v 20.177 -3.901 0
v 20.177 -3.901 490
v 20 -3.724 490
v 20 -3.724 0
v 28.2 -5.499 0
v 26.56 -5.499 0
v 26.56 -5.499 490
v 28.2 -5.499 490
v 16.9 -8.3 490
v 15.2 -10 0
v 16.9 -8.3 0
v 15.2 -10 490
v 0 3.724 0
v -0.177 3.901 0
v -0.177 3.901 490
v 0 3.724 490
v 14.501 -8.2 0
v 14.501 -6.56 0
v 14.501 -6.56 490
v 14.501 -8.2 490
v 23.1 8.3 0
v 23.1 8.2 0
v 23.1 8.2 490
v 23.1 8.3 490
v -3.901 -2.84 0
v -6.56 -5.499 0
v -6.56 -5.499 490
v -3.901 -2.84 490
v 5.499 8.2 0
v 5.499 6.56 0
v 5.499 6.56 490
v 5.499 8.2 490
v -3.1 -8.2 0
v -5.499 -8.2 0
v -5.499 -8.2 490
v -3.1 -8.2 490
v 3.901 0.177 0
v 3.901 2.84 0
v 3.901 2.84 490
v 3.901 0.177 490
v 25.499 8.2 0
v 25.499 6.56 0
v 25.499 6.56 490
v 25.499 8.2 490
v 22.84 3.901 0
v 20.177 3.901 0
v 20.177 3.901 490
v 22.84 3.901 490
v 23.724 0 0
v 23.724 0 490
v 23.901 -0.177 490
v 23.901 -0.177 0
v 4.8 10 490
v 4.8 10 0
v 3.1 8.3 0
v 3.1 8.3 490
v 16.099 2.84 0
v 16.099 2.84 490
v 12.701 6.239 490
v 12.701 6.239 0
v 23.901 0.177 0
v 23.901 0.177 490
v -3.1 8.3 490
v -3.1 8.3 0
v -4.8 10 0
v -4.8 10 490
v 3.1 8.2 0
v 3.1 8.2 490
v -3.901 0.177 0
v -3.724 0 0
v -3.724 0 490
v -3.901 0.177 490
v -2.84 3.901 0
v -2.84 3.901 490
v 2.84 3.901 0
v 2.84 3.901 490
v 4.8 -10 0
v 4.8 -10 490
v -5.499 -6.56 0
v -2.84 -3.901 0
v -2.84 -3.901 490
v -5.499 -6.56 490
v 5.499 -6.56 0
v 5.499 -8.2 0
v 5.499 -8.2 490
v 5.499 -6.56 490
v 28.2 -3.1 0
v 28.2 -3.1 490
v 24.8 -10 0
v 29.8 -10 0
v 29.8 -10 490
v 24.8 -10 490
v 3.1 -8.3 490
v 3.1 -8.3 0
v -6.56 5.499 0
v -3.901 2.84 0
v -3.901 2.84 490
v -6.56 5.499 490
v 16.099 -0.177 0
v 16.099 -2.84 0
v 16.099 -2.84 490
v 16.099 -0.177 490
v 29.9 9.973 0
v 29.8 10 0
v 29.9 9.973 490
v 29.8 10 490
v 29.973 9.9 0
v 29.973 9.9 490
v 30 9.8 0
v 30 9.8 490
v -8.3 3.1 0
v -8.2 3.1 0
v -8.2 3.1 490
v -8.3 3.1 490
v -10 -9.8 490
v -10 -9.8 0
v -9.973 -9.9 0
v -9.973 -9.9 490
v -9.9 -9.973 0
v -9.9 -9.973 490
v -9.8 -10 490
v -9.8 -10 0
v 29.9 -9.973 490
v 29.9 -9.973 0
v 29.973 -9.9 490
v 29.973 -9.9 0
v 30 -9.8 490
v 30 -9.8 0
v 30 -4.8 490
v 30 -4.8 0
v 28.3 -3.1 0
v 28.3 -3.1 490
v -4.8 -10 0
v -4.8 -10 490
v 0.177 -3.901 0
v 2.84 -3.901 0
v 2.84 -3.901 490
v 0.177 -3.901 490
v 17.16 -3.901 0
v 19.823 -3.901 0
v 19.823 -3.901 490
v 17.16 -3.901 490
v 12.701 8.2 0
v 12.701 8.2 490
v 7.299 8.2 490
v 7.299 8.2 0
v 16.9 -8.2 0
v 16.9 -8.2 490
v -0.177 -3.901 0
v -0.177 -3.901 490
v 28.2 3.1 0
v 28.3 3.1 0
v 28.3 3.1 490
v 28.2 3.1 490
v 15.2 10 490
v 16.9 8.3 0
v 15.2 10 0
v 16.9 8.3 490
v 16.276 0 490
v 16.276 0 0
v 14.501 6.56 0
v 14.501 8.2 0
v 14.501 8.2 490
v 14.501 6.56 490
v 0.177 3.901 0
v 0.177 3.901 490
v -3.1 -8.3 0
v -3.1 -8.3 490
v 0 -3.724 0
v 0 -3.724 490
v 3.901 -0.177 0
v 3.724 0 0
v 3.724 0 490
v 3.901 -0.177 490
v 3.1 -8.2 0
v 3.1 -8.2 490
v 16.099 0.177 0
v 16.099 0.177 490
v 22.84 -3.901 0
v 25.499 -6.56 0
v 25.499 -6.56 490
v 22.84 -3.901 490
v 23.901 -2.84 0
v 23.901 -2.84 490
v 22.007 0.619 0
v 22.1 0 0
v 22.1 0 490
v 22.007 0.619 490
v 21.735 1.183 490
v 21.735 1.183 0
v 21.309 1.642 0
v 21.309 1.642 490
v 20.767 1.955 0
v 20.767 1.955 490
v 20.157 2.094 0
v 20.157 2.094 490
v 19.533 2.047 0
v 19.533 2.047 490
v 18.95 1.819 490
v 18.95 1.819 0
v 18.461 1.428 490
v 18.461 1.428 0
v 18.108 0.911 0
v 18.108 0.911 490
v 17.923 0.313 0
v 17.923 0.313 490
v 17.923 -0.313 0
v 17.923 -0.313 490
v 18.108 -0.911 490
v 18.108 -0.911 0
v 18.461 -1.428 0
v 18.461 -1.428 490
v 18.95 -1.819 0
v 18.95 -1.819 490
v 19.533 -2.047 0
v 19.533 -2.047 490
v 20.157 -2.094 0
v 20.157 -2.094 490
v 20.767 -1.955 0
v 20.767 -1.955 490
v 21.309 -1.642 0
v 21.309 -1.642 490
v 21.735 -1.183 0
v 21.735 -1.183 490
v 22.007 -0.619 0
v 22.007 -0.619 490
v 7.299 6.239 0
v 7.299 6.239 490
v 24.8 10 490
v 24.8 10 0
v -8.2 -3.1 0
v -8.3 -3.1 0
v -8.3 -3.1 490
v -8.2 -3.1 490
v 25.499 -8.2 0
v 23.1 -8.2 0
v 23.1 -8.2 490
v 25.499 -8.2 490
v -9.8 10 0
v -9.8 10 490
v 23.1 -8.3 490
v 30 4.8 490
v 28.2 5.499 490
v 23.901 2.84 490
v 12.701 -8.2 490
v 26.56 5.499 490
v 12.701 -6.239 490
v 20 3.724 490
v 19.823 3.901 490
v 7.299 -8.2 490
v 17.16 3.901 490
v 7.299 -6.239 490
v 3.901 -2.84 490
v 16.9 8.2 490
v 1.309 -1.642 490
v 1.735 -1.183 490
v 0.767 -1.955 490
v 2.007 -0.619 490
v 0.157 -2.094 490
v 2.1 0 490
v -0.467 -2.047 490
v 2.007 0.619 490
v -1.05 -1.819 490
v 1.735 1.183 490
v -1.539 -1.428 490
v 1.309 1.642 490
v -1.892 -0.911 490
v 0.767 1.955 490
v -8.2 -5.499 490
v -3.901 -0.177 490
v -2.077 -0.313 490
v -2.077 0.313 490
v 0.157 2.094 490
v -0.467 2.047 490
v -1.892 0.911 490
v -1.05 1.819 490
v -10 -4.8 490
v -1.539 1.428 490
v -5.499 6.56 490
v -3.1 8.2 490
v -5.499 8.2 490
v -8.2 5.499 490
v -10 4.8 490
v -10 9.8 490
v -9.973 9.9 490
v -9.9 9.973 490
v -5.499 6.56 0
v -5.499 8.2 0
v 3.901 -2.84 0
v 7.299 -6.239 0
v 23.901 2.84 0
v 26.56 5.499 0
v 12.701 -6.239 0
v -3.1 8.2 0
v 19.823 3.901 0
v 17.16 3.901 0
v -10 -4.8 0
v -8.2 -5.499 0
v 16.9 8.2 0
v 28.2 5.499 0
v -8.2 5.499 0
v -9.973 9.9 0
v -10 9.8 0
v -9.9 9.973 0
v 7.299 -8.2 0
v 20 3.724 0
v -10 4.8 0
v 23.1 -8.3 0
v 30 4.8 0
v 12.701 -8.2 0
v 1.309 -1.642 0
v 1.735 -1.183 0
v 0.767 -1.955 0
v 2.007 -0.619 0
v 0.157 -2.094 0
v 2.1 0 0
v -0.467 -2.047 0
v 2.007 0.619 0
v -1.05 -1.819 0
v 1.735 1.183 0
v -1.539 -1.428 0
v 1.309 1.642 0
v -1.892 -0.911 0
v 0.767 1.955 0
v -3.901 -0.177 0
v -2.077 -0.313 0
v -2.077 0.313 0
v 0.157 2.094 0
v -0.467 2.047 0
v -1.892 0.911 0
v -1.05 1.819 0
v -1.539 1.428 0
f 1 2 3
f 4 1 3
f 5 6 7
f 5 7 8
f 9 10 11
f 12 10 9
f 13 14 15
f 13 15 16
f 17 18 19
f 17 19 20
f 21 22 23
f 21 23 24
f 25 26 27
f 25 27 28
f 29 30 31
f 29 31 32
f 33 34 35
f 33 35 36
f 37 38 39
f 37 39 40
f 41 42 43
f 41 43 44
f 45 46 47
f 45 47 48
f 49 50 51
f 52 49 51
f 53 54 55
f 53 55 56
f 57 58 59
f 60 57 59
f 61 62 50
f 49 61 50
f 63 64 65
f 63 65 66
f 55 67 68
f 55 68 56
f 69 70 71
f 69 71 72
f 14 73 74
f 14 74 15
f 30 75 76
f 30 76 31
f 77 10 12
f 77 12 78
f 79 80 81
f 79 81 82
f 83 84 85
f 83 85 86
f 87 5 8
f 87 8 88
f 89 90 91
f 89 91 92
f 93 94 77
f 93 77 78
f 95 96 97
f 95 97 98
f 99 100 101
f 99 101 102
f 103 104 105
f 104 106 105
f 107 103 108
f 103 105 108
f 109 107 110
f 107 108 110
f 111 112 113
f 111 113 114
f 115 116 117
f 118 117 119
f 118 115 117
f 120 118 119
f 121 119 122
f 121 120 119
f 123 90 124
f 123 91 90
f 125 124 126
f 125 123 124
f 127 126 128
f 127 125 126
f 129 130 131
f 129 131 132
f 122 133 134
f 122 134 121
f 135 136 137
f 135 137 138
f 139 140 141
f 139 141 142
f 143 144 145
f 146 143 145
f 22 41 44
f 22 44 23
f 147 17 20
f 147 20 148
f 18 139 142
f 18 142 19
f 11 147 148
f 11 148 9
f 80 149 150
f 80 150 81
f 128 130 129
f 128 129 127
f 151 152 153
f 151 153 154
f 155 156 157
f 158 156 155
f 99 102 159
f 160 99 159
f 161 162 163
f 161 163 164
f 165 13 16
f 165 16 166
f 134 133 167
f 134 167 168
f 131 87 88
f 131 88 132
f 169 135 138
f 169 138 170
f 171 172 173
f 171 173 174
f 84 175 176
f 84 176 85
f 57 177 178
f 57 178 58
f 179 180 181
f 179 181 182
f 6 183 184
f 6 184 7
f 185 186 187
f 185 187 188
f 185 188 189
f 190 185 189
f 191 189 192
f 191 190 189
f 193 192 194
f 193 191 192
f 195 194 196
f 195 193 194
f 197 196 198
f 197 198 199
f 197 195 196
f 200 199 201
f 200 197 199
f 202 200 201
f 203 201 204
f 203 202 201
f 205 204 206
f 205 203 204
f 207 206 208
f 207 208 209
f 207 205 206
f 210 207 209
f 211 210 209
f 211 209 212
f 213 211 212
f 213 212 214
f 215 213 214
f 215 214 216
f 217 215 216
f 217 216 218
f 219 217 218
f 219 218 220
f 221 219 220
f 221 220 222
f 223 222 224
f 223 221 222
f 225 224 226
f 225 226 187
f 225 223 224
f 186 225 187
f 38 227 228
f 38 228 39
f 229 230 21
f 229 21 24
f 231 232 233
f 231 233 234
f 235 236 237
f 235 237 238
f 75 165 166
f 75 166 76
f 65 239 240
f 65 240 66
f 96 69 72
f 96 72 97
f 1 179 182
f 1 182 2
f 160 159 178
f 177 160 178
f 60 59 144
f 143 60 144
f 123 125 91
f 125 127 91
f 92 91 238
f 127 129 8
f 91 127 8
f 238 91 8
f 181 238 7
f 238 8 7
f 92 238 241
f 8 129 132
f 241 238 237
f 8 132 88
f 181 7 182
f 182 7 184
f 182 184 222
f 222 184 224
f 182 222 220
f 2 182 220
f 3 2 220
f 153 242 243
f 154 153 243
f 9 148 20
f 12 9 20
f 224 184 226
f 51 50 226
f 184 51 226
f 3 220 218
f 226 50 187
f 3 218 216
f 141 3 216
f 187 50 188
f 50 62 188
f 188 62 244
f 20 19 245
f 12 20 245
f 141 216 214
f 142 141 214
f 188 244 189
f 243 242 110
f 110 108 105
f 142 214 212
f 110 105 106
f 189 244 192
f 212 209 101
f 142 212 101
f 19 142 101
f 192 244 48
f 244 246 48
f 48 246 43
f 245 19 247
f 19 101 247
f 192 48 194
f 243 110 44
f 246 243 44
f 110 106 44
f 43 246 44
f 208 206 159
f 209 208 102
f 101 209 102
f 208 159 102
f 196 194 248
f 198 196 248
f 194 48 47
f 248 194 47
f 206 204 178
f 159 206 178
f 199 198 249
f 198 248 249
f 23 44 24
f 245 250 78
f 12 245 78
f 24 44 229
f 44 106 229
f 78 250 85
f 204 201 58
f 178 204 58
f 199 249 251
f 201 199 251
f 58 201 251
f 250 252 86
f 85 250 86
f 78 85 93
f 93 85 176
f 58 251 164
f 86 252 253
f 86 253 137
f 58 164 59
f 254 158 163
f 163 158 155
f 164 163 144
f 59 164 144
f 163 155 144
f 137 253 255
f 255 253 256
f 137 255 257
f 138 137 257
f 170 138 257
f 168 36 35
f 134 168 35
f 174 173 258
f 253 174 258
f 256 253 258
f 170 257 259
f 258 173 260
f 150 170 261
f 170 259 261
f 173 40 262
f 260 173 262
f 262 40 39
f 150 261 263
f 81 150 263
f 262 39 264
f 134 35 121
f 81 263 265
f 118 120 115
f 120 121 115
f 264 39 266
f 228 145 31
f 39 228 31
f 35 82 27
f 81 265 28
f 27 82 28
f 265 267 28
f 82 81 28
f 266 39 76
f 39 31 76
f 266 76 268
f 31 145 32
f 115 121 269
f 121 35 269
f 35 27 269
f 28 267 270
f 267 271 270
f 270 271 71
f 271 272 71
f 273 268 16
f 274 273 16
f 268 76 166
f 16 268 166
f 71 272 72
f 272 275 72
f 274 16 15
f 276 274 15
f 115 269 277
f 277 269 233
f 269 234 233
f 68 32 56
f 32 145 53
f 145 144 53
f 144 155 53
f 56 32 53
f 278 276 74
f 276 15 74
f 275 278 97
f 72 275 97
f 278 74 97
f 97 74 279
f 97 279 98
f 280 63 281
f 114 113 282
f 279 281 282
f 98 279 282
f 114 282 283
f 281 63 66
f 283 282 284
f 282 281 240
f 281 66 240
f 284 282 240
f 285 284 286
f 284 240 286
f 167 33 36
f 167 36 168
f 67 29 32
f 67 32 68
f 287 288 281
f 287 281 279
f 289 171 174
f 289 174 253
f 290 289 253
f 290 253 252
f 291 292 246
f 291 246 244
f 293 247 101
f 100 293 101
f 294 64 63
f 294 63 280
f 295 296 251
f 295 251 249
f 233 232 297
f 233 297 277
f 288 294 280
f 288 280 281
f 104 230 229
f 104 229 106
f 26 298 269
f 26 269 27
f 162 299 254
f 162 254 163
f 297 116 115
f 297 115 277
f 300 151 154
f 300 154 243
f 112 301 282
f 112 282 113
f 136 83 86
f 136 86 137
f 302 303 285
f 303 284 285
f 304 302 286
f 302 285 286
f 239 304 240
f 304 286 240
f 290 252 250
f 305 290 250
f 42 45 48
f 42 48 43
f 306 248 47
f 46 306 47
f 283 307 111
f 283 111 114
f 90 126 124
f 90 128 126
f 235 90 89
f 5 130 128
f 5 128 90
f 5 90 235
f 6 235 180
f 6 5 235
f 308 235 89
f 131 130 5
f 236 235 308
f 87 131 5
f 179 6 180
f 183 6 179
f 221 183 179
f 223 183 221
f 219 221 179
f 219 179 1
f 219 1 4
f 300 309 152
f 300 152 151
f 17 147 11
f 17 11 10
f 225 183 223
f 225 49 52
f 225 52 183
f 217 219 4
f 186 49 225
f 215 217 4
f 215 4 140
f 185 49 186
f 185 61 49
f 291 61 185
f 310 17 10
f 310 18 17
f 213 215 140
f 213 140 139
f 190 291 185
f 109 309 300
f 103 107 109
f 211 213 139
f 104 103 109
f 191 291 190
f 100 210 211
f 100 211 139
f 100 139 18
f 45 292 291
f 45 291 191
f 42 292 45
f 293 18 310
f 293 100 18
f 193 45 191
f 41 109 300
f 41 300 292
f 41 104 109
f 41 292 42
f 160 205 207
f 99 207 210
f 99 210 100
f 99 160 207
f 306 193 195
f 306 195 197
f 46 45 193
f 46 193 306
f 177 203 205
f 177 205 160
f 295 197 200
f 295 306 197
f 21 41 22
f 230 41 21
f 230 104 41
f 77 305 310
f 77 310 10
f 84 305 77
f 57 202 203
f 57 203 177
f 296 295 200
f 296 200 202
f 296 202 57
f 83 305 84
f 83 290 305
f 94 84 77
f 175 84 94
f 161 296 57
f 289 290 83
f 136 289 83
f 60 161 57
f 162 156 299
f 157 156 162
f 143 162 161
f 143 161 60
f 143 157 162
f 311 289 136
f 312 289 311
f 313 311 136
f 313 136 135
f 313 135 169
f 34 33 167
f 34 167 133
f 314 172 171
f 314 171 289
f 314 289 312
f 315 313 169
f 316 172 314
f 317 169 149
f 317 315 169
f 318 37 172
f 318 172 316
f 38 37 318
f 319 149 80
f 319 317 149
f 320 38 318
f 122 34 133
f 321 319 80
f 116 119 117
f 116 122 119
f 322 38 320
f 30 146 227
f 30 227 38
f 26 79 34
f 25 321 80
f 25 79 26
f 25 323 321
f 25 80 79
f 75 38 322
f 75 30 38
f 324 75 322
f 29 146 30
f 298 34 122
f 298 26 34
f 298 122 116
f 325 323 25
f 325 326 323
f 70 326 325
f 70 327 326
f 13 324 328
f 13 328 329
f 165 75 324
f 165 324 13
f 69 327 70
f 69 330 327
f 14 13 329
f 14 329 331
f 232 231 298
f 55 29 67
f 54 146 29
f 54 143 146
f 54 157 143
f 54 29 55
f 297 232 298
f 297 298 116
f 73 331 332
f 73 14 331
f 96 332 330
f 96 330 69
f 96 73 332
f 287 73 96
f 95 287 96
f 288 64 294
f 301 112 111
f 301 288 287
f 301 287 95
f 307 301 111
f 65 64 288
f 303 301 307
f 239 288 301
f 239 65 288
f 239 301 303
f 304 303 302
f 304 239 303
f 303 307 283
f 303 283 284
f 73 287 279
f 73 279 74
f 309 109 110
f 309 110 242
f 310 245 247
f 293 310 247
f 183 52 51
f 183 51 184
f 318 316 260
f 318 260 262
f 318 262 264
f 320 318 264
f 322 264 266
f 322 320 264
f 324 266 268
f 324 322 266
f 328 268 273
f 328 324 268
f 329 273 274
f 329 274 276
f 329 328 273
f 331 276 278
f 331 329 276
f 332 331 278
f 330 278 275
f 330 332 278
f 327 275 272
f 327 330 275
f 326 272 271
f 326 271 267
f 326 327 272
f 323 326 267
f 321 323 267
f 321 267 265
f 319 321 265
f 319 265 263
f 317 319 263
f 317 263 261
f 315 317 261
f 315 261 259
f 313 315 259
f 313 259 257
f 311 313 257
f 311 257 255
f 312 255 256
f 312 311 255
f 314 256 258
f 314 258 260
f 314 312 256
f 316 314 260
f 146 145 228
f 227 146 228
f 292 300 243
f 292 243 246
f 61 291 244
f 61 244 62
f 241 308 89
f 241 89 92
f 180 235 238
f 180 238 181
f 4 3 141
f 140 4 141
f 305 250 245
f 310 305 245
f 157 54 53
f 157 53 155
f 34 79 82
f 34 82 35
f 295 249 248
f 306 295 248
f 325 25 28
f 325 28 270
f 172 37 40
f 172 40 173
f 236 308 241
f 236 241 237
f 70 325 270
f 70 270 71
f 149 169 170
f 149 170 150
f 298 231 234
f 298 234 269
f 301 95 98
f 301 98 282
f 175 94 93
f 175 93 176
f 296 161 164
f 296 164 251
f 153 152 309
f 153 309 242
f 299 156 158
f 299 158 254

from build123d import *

# Parameters (mm, degrees)
SKETCH003_R         = 2.1
PAD003_DEPTH        = 490
CHAMFER003_1_ANGLE  = 45
CHAMFER003_1_SIZE   = 1.7
CHAMFER003_2_ANGLE  = 45
CHAMFER003_2_SIZE   = 1.7
CHAMFER003_3_ANGLE  = 45
CHAMFER003_3_SIZE   = 1.7
CHAMFER003_4_ANGLE  = 45
CHAMFER003_4_SIZE   = 1.7
CHAMFER003_5_ANGLE  = 45
CHAMFER003_5_SIZE   = 1.7
CHAMFER003_6_ANGLE  = 45
CHAMFER003_6_SIZE   = 1.7
CHAMFER003_7_ANGLE  = 45
CHAMFER003_7_SIZE   = 1.7
CHAMFER003_8_ANGLE  = 45
CHAMFER003_8_SIZE   = 1.7
CHAMFER003_9_ANGLE  = 45
CHAMFER003_9_SIZE   = 1.7
CHAMFER003_10_ANGLE = 45
CHAMFER003_10_SIZE  = 1.7
CHAMFER003_11_ANGLE = 45
CHAMFER003_11_SIZE  = 1.7
CHAMFER003_12_ANGLE = 45
CHAMFER003_12_SIZE  = 1.7
FILLET003_R         = 0.2


with BuildPart() as part:
    # Sketch003 → Pad003 (new body)
    with BuildSketch(Plane.XY):
        Polygon((0, 3.723883), (0.176777, 3.90066), (2.84, 3.90066), (5.49934, 6.56), (5.49934, 8.2), (3.1, 8.2), (3.1, 10), (16.9, 10), (16.9, 8.2), (14.50066, 8.2), (14.50066, 6.56), (17.16, 3.90066), (19.823223, 3.90066), (20, 3.723883), (20.176777, 3.90066), (22.84, 3.90066), (25.49934, 6.56), (25.49934, 8.2), (23.1, 8.2), (23.1, 10), (30, 10), (30, 3.1), (28.2, 3.1), (28.2, 5.49934), (26.56, 5.49934), (23.90066, 2.84), (23.90066, 0.176777), (23.723883, 0), (23.90066, -0.176777), (23.90066, -2.84), (26.56, -5.49934), (28.2, -5.49934), (28.2, -3.1), (30, -3.1), (30, -10), (23.1, -10), (23.1, -8.2), (25.49934, -8.2), (25.49934, -6.56), (22.84, -3.90066), (20.176777, -3.90066), (20, -3.723883), (19.823223, -3.90066), (17.16, -3.90066), (14.50066, -6.56), (14.50066, -8.2), (16.9, -8.2), (16.9, -10), (3.1, -10), (3.1, -8.2), (5.49934, -8.2), (5.49934, -6.56), (2.84, -3.90066), (0.176777, -3.90066), (0, -3.723883), (-0.176777, -3.90066), (-2.84, -3.90066), (-5.49934, -6.56), (-5.49934, -8.2), (-3.1, -8.2), (-3.1, -10), (-10, -10), (-10, -3.1), (-8.2, -3.1), (-8.2, -5.49934), (-6.56, -5.49934), (-3.90066, -2.84), (-3.90066, -0.176777), (-3.723883, 0), (-3.90066, 0.176777), (-3.90066, 2.84), (-6.56, 5.49934), (-8.2, 5.49934), (-8.2, 3.1), (-10, 3.1), (-10, 10), (-3.1, 10), (-3.1, 8.2), (-5.49934, 8.2), (-5.49934, 6.56), (-2.84, 3.90066), (-0.176777, 3.90066), align=None)
        Circle(SKETCH003_R, mode=Mode.SUBTRACT)
        with Locations((20, 0)):
            Circle(SKETCH003_R, mode=Mode.SUBTRACT)
        Polygon((7.29934, 6.23868), (3.90066, 2.84), (3.90066, 0.176777), (3.723883, 0), (3.90066, -0.176777), (3.90066, -2.84), (7.29934, -6.23868), (7.29934, -8.2), (12.70066, -8.2), (12.70066, -6.23868), (16.09934, -2.84), (16.09934, -0.176777), (16.276117, 0), (16.09934, 0.176777), (16.09934, 2.84), (12.70066, 6.23868), (12.70066, 8.2), (7.29934, 8.2), align=None, mode=Mode.SUBTRACT)
    extrude(amount=PAD003_DEPTH)

    # Chamfer003 1
    chamfer003_1_edges = [part.edges().sort_by_distance(p)[0] for p in [
        (3.1, -10, 245),
    ]]
    chamfer003_1_side = part.faces().sort_by_distance((10, -10, 245))[0]
    chamfer(chamfer003_1_edges, length=CHAMFER003_1_SIZE, angle=CHAMFER003_1_ANGLE, reference=chamfer003_1_side)

    # Chamfer003 2
    chamfer003_2_edges = [part.edges().sort_by_distance(p)[0] for p in [
        (16.9, -10, 245),
    ]]
    chamfer003_2_side = part.faces().sort_by_distance((16.9, -9.1, 245))[0]
    chamfer(chamfer003_2_edges, length=CHAMFER003_2_SIZE, angle=CHAMFER003_2_ANGLE, reference=chamfer003_2_side)

    # Chamfer003 3
    chamfer003_3_edges = [part.edges().sort_by_distance(p)[0] for p in [
        (23.1, -10, 245),
    ]]
    chamfer003_3_side = part.faces().sort_by_distance((26.55, -10, 245))[0]
    chamfer(chamfer003_3_edges, length=CHAMFER003_3_SIZE, angle=CHAMFER003_3_ANGLE, reference=chamfer003_3_side)

    # Chamfer003 4
    chamfer003_4_edges = [part.edges().sort_by_distance(p)[0] for p in [
        (-3.1, -10, 245),
    ]]
    chamfer003_4_side = part.faces().sort_by_distance((-3.1, -9.1, 245))[0]
    chamfer(chamfer003_4_edges, length=CHAMFER003_4_SIZE, angle=CHAMFER003_4_ANGLE, reference=chamfer003_4_side)

    # Chamfer003 5
    chamfer003_5_edges = [part.edges().sort_by_distance(p)[0] for p in [
        (30, -3.1, 245),
    ]]
    chamfer003_5_side = part.faces().sort_by_distance((29.1, -3.1, 245))[0]
    chamfer(chamfer003_5_edges, length=CHAMFER003_5_SIZE, angle=CHAMFER003_5_ANGLE, reference=chamfer003_5_side)

    # Chamfer003 6
    chamfer003_6_edges = [part.edges().sort_by_distance(p)[0] for p in [
        (30, 3.1, 245),
    ]]
    chamfer003_6_side = part.faces().sort_by_distance((30, 6.55, 245))[0]
    chamfer(chamfer003_6_edges, length=CHAMFER003_6_SIZE, angle=CHAMFER003_6_ANGLE, reference=chamfer003_6_side)

    # Chamfer003 7
    chamfer003_7_edges = [part.edges().sort_by_distance(p)[0] for p in [
        (23.1, 10, 245),
    ]]
    chamfer003_7_side = part.faces().sort_by_distance((23.1, 9.1, 245))[0]
    chamfer(chamfer003_7_edges, length=CHAMFER003_7_SIZE, angle=CHAMFER003_7_ANGLE, reference=chamfer003_7_side)

    # Chamfer003 8
    chamfer003_8_edges = [part.edges().sort_by_distance(p)[0] for p in [
        (16.9, 10, 245),
    ]]
    chamfer003_8_side = part.faces().sort_by_distance((10, 10, 245))[0]
    chamfer(chamfer003_8_edges, length=CHAMFER003_8_SIZE, angle=CHAMFER003_8_ANGLE, reference=chamfer003_8_side)

    # Chamfer003 9
    chamfer003_9_edges = [part.edges().sort_by_distance(p)[0] for p in [
        (3.1, 10, 245),
    ]]
    chamfer003_9_side = part.faces().sort_by_distance((3.1, 9.1, 245))[0]
    chamfer(chamfer003_9_edges, length=CHAMFER003_9_SIZE, angle=CHAMFER003_9_ANGLE, reference=chamfer003_9_side)

    # Chamfer003 10
    chamfer003_10_edges = [part.edges().sort_by_distance(p)[0] for p in [
        (-3.1, 10, 245),
    ]]
    chamfer003_10_side = part.faces().sort_by_distance((-6.55, 10, 245))[0]
    chamfer(chamfer003_10_edges, length=CHAMFER003_10_SIZE, angle=CHAMFER003_10_ANGLE, reference=chamfer003_10_side)

    # Chamfer003 11
    chamfer003_11_edges = [part.edges().sort_by_distance(p)[0] for p in [
        (-10, -3.1, 245),
    ]]
    chamfer003_11_side = part.faces().sort_by_distance((-10, -6.55, 245))[0]
    chamfer(chamfer003_11_edges, length=CHAMFER003_11_SIZE, angle=CHAMFER003_11_ANGLE, reference=chamfer003_11_side)

    # Chamfer003 12
    chamfer003_12_edges = [part.edges().sort_by_distance(p)[0] for p in [
        (-10, 3.1, 245),
    ]]
    chamfer003_12_side = part.faces().sort_by_distance((-9.1, 3.1, 245))[0]
    chamfer(chamfer003_12_edges, length=CHAMFER003_12_SIZE, angle=CHAMFER003_12_ANGLE, reference=chamfer003_12_side)

    # Fillet003
    fillet003_edges = [part.edges().sort_by_distance(p)[0] for p in [
        (-10, -10, 245),
        (-10, 10, 245),
        (30, 10, 245),
        (30, -10, 245),
    ]]
    fillet(fillet003_edges, radius=FILLET003_R)


solid = part.part
